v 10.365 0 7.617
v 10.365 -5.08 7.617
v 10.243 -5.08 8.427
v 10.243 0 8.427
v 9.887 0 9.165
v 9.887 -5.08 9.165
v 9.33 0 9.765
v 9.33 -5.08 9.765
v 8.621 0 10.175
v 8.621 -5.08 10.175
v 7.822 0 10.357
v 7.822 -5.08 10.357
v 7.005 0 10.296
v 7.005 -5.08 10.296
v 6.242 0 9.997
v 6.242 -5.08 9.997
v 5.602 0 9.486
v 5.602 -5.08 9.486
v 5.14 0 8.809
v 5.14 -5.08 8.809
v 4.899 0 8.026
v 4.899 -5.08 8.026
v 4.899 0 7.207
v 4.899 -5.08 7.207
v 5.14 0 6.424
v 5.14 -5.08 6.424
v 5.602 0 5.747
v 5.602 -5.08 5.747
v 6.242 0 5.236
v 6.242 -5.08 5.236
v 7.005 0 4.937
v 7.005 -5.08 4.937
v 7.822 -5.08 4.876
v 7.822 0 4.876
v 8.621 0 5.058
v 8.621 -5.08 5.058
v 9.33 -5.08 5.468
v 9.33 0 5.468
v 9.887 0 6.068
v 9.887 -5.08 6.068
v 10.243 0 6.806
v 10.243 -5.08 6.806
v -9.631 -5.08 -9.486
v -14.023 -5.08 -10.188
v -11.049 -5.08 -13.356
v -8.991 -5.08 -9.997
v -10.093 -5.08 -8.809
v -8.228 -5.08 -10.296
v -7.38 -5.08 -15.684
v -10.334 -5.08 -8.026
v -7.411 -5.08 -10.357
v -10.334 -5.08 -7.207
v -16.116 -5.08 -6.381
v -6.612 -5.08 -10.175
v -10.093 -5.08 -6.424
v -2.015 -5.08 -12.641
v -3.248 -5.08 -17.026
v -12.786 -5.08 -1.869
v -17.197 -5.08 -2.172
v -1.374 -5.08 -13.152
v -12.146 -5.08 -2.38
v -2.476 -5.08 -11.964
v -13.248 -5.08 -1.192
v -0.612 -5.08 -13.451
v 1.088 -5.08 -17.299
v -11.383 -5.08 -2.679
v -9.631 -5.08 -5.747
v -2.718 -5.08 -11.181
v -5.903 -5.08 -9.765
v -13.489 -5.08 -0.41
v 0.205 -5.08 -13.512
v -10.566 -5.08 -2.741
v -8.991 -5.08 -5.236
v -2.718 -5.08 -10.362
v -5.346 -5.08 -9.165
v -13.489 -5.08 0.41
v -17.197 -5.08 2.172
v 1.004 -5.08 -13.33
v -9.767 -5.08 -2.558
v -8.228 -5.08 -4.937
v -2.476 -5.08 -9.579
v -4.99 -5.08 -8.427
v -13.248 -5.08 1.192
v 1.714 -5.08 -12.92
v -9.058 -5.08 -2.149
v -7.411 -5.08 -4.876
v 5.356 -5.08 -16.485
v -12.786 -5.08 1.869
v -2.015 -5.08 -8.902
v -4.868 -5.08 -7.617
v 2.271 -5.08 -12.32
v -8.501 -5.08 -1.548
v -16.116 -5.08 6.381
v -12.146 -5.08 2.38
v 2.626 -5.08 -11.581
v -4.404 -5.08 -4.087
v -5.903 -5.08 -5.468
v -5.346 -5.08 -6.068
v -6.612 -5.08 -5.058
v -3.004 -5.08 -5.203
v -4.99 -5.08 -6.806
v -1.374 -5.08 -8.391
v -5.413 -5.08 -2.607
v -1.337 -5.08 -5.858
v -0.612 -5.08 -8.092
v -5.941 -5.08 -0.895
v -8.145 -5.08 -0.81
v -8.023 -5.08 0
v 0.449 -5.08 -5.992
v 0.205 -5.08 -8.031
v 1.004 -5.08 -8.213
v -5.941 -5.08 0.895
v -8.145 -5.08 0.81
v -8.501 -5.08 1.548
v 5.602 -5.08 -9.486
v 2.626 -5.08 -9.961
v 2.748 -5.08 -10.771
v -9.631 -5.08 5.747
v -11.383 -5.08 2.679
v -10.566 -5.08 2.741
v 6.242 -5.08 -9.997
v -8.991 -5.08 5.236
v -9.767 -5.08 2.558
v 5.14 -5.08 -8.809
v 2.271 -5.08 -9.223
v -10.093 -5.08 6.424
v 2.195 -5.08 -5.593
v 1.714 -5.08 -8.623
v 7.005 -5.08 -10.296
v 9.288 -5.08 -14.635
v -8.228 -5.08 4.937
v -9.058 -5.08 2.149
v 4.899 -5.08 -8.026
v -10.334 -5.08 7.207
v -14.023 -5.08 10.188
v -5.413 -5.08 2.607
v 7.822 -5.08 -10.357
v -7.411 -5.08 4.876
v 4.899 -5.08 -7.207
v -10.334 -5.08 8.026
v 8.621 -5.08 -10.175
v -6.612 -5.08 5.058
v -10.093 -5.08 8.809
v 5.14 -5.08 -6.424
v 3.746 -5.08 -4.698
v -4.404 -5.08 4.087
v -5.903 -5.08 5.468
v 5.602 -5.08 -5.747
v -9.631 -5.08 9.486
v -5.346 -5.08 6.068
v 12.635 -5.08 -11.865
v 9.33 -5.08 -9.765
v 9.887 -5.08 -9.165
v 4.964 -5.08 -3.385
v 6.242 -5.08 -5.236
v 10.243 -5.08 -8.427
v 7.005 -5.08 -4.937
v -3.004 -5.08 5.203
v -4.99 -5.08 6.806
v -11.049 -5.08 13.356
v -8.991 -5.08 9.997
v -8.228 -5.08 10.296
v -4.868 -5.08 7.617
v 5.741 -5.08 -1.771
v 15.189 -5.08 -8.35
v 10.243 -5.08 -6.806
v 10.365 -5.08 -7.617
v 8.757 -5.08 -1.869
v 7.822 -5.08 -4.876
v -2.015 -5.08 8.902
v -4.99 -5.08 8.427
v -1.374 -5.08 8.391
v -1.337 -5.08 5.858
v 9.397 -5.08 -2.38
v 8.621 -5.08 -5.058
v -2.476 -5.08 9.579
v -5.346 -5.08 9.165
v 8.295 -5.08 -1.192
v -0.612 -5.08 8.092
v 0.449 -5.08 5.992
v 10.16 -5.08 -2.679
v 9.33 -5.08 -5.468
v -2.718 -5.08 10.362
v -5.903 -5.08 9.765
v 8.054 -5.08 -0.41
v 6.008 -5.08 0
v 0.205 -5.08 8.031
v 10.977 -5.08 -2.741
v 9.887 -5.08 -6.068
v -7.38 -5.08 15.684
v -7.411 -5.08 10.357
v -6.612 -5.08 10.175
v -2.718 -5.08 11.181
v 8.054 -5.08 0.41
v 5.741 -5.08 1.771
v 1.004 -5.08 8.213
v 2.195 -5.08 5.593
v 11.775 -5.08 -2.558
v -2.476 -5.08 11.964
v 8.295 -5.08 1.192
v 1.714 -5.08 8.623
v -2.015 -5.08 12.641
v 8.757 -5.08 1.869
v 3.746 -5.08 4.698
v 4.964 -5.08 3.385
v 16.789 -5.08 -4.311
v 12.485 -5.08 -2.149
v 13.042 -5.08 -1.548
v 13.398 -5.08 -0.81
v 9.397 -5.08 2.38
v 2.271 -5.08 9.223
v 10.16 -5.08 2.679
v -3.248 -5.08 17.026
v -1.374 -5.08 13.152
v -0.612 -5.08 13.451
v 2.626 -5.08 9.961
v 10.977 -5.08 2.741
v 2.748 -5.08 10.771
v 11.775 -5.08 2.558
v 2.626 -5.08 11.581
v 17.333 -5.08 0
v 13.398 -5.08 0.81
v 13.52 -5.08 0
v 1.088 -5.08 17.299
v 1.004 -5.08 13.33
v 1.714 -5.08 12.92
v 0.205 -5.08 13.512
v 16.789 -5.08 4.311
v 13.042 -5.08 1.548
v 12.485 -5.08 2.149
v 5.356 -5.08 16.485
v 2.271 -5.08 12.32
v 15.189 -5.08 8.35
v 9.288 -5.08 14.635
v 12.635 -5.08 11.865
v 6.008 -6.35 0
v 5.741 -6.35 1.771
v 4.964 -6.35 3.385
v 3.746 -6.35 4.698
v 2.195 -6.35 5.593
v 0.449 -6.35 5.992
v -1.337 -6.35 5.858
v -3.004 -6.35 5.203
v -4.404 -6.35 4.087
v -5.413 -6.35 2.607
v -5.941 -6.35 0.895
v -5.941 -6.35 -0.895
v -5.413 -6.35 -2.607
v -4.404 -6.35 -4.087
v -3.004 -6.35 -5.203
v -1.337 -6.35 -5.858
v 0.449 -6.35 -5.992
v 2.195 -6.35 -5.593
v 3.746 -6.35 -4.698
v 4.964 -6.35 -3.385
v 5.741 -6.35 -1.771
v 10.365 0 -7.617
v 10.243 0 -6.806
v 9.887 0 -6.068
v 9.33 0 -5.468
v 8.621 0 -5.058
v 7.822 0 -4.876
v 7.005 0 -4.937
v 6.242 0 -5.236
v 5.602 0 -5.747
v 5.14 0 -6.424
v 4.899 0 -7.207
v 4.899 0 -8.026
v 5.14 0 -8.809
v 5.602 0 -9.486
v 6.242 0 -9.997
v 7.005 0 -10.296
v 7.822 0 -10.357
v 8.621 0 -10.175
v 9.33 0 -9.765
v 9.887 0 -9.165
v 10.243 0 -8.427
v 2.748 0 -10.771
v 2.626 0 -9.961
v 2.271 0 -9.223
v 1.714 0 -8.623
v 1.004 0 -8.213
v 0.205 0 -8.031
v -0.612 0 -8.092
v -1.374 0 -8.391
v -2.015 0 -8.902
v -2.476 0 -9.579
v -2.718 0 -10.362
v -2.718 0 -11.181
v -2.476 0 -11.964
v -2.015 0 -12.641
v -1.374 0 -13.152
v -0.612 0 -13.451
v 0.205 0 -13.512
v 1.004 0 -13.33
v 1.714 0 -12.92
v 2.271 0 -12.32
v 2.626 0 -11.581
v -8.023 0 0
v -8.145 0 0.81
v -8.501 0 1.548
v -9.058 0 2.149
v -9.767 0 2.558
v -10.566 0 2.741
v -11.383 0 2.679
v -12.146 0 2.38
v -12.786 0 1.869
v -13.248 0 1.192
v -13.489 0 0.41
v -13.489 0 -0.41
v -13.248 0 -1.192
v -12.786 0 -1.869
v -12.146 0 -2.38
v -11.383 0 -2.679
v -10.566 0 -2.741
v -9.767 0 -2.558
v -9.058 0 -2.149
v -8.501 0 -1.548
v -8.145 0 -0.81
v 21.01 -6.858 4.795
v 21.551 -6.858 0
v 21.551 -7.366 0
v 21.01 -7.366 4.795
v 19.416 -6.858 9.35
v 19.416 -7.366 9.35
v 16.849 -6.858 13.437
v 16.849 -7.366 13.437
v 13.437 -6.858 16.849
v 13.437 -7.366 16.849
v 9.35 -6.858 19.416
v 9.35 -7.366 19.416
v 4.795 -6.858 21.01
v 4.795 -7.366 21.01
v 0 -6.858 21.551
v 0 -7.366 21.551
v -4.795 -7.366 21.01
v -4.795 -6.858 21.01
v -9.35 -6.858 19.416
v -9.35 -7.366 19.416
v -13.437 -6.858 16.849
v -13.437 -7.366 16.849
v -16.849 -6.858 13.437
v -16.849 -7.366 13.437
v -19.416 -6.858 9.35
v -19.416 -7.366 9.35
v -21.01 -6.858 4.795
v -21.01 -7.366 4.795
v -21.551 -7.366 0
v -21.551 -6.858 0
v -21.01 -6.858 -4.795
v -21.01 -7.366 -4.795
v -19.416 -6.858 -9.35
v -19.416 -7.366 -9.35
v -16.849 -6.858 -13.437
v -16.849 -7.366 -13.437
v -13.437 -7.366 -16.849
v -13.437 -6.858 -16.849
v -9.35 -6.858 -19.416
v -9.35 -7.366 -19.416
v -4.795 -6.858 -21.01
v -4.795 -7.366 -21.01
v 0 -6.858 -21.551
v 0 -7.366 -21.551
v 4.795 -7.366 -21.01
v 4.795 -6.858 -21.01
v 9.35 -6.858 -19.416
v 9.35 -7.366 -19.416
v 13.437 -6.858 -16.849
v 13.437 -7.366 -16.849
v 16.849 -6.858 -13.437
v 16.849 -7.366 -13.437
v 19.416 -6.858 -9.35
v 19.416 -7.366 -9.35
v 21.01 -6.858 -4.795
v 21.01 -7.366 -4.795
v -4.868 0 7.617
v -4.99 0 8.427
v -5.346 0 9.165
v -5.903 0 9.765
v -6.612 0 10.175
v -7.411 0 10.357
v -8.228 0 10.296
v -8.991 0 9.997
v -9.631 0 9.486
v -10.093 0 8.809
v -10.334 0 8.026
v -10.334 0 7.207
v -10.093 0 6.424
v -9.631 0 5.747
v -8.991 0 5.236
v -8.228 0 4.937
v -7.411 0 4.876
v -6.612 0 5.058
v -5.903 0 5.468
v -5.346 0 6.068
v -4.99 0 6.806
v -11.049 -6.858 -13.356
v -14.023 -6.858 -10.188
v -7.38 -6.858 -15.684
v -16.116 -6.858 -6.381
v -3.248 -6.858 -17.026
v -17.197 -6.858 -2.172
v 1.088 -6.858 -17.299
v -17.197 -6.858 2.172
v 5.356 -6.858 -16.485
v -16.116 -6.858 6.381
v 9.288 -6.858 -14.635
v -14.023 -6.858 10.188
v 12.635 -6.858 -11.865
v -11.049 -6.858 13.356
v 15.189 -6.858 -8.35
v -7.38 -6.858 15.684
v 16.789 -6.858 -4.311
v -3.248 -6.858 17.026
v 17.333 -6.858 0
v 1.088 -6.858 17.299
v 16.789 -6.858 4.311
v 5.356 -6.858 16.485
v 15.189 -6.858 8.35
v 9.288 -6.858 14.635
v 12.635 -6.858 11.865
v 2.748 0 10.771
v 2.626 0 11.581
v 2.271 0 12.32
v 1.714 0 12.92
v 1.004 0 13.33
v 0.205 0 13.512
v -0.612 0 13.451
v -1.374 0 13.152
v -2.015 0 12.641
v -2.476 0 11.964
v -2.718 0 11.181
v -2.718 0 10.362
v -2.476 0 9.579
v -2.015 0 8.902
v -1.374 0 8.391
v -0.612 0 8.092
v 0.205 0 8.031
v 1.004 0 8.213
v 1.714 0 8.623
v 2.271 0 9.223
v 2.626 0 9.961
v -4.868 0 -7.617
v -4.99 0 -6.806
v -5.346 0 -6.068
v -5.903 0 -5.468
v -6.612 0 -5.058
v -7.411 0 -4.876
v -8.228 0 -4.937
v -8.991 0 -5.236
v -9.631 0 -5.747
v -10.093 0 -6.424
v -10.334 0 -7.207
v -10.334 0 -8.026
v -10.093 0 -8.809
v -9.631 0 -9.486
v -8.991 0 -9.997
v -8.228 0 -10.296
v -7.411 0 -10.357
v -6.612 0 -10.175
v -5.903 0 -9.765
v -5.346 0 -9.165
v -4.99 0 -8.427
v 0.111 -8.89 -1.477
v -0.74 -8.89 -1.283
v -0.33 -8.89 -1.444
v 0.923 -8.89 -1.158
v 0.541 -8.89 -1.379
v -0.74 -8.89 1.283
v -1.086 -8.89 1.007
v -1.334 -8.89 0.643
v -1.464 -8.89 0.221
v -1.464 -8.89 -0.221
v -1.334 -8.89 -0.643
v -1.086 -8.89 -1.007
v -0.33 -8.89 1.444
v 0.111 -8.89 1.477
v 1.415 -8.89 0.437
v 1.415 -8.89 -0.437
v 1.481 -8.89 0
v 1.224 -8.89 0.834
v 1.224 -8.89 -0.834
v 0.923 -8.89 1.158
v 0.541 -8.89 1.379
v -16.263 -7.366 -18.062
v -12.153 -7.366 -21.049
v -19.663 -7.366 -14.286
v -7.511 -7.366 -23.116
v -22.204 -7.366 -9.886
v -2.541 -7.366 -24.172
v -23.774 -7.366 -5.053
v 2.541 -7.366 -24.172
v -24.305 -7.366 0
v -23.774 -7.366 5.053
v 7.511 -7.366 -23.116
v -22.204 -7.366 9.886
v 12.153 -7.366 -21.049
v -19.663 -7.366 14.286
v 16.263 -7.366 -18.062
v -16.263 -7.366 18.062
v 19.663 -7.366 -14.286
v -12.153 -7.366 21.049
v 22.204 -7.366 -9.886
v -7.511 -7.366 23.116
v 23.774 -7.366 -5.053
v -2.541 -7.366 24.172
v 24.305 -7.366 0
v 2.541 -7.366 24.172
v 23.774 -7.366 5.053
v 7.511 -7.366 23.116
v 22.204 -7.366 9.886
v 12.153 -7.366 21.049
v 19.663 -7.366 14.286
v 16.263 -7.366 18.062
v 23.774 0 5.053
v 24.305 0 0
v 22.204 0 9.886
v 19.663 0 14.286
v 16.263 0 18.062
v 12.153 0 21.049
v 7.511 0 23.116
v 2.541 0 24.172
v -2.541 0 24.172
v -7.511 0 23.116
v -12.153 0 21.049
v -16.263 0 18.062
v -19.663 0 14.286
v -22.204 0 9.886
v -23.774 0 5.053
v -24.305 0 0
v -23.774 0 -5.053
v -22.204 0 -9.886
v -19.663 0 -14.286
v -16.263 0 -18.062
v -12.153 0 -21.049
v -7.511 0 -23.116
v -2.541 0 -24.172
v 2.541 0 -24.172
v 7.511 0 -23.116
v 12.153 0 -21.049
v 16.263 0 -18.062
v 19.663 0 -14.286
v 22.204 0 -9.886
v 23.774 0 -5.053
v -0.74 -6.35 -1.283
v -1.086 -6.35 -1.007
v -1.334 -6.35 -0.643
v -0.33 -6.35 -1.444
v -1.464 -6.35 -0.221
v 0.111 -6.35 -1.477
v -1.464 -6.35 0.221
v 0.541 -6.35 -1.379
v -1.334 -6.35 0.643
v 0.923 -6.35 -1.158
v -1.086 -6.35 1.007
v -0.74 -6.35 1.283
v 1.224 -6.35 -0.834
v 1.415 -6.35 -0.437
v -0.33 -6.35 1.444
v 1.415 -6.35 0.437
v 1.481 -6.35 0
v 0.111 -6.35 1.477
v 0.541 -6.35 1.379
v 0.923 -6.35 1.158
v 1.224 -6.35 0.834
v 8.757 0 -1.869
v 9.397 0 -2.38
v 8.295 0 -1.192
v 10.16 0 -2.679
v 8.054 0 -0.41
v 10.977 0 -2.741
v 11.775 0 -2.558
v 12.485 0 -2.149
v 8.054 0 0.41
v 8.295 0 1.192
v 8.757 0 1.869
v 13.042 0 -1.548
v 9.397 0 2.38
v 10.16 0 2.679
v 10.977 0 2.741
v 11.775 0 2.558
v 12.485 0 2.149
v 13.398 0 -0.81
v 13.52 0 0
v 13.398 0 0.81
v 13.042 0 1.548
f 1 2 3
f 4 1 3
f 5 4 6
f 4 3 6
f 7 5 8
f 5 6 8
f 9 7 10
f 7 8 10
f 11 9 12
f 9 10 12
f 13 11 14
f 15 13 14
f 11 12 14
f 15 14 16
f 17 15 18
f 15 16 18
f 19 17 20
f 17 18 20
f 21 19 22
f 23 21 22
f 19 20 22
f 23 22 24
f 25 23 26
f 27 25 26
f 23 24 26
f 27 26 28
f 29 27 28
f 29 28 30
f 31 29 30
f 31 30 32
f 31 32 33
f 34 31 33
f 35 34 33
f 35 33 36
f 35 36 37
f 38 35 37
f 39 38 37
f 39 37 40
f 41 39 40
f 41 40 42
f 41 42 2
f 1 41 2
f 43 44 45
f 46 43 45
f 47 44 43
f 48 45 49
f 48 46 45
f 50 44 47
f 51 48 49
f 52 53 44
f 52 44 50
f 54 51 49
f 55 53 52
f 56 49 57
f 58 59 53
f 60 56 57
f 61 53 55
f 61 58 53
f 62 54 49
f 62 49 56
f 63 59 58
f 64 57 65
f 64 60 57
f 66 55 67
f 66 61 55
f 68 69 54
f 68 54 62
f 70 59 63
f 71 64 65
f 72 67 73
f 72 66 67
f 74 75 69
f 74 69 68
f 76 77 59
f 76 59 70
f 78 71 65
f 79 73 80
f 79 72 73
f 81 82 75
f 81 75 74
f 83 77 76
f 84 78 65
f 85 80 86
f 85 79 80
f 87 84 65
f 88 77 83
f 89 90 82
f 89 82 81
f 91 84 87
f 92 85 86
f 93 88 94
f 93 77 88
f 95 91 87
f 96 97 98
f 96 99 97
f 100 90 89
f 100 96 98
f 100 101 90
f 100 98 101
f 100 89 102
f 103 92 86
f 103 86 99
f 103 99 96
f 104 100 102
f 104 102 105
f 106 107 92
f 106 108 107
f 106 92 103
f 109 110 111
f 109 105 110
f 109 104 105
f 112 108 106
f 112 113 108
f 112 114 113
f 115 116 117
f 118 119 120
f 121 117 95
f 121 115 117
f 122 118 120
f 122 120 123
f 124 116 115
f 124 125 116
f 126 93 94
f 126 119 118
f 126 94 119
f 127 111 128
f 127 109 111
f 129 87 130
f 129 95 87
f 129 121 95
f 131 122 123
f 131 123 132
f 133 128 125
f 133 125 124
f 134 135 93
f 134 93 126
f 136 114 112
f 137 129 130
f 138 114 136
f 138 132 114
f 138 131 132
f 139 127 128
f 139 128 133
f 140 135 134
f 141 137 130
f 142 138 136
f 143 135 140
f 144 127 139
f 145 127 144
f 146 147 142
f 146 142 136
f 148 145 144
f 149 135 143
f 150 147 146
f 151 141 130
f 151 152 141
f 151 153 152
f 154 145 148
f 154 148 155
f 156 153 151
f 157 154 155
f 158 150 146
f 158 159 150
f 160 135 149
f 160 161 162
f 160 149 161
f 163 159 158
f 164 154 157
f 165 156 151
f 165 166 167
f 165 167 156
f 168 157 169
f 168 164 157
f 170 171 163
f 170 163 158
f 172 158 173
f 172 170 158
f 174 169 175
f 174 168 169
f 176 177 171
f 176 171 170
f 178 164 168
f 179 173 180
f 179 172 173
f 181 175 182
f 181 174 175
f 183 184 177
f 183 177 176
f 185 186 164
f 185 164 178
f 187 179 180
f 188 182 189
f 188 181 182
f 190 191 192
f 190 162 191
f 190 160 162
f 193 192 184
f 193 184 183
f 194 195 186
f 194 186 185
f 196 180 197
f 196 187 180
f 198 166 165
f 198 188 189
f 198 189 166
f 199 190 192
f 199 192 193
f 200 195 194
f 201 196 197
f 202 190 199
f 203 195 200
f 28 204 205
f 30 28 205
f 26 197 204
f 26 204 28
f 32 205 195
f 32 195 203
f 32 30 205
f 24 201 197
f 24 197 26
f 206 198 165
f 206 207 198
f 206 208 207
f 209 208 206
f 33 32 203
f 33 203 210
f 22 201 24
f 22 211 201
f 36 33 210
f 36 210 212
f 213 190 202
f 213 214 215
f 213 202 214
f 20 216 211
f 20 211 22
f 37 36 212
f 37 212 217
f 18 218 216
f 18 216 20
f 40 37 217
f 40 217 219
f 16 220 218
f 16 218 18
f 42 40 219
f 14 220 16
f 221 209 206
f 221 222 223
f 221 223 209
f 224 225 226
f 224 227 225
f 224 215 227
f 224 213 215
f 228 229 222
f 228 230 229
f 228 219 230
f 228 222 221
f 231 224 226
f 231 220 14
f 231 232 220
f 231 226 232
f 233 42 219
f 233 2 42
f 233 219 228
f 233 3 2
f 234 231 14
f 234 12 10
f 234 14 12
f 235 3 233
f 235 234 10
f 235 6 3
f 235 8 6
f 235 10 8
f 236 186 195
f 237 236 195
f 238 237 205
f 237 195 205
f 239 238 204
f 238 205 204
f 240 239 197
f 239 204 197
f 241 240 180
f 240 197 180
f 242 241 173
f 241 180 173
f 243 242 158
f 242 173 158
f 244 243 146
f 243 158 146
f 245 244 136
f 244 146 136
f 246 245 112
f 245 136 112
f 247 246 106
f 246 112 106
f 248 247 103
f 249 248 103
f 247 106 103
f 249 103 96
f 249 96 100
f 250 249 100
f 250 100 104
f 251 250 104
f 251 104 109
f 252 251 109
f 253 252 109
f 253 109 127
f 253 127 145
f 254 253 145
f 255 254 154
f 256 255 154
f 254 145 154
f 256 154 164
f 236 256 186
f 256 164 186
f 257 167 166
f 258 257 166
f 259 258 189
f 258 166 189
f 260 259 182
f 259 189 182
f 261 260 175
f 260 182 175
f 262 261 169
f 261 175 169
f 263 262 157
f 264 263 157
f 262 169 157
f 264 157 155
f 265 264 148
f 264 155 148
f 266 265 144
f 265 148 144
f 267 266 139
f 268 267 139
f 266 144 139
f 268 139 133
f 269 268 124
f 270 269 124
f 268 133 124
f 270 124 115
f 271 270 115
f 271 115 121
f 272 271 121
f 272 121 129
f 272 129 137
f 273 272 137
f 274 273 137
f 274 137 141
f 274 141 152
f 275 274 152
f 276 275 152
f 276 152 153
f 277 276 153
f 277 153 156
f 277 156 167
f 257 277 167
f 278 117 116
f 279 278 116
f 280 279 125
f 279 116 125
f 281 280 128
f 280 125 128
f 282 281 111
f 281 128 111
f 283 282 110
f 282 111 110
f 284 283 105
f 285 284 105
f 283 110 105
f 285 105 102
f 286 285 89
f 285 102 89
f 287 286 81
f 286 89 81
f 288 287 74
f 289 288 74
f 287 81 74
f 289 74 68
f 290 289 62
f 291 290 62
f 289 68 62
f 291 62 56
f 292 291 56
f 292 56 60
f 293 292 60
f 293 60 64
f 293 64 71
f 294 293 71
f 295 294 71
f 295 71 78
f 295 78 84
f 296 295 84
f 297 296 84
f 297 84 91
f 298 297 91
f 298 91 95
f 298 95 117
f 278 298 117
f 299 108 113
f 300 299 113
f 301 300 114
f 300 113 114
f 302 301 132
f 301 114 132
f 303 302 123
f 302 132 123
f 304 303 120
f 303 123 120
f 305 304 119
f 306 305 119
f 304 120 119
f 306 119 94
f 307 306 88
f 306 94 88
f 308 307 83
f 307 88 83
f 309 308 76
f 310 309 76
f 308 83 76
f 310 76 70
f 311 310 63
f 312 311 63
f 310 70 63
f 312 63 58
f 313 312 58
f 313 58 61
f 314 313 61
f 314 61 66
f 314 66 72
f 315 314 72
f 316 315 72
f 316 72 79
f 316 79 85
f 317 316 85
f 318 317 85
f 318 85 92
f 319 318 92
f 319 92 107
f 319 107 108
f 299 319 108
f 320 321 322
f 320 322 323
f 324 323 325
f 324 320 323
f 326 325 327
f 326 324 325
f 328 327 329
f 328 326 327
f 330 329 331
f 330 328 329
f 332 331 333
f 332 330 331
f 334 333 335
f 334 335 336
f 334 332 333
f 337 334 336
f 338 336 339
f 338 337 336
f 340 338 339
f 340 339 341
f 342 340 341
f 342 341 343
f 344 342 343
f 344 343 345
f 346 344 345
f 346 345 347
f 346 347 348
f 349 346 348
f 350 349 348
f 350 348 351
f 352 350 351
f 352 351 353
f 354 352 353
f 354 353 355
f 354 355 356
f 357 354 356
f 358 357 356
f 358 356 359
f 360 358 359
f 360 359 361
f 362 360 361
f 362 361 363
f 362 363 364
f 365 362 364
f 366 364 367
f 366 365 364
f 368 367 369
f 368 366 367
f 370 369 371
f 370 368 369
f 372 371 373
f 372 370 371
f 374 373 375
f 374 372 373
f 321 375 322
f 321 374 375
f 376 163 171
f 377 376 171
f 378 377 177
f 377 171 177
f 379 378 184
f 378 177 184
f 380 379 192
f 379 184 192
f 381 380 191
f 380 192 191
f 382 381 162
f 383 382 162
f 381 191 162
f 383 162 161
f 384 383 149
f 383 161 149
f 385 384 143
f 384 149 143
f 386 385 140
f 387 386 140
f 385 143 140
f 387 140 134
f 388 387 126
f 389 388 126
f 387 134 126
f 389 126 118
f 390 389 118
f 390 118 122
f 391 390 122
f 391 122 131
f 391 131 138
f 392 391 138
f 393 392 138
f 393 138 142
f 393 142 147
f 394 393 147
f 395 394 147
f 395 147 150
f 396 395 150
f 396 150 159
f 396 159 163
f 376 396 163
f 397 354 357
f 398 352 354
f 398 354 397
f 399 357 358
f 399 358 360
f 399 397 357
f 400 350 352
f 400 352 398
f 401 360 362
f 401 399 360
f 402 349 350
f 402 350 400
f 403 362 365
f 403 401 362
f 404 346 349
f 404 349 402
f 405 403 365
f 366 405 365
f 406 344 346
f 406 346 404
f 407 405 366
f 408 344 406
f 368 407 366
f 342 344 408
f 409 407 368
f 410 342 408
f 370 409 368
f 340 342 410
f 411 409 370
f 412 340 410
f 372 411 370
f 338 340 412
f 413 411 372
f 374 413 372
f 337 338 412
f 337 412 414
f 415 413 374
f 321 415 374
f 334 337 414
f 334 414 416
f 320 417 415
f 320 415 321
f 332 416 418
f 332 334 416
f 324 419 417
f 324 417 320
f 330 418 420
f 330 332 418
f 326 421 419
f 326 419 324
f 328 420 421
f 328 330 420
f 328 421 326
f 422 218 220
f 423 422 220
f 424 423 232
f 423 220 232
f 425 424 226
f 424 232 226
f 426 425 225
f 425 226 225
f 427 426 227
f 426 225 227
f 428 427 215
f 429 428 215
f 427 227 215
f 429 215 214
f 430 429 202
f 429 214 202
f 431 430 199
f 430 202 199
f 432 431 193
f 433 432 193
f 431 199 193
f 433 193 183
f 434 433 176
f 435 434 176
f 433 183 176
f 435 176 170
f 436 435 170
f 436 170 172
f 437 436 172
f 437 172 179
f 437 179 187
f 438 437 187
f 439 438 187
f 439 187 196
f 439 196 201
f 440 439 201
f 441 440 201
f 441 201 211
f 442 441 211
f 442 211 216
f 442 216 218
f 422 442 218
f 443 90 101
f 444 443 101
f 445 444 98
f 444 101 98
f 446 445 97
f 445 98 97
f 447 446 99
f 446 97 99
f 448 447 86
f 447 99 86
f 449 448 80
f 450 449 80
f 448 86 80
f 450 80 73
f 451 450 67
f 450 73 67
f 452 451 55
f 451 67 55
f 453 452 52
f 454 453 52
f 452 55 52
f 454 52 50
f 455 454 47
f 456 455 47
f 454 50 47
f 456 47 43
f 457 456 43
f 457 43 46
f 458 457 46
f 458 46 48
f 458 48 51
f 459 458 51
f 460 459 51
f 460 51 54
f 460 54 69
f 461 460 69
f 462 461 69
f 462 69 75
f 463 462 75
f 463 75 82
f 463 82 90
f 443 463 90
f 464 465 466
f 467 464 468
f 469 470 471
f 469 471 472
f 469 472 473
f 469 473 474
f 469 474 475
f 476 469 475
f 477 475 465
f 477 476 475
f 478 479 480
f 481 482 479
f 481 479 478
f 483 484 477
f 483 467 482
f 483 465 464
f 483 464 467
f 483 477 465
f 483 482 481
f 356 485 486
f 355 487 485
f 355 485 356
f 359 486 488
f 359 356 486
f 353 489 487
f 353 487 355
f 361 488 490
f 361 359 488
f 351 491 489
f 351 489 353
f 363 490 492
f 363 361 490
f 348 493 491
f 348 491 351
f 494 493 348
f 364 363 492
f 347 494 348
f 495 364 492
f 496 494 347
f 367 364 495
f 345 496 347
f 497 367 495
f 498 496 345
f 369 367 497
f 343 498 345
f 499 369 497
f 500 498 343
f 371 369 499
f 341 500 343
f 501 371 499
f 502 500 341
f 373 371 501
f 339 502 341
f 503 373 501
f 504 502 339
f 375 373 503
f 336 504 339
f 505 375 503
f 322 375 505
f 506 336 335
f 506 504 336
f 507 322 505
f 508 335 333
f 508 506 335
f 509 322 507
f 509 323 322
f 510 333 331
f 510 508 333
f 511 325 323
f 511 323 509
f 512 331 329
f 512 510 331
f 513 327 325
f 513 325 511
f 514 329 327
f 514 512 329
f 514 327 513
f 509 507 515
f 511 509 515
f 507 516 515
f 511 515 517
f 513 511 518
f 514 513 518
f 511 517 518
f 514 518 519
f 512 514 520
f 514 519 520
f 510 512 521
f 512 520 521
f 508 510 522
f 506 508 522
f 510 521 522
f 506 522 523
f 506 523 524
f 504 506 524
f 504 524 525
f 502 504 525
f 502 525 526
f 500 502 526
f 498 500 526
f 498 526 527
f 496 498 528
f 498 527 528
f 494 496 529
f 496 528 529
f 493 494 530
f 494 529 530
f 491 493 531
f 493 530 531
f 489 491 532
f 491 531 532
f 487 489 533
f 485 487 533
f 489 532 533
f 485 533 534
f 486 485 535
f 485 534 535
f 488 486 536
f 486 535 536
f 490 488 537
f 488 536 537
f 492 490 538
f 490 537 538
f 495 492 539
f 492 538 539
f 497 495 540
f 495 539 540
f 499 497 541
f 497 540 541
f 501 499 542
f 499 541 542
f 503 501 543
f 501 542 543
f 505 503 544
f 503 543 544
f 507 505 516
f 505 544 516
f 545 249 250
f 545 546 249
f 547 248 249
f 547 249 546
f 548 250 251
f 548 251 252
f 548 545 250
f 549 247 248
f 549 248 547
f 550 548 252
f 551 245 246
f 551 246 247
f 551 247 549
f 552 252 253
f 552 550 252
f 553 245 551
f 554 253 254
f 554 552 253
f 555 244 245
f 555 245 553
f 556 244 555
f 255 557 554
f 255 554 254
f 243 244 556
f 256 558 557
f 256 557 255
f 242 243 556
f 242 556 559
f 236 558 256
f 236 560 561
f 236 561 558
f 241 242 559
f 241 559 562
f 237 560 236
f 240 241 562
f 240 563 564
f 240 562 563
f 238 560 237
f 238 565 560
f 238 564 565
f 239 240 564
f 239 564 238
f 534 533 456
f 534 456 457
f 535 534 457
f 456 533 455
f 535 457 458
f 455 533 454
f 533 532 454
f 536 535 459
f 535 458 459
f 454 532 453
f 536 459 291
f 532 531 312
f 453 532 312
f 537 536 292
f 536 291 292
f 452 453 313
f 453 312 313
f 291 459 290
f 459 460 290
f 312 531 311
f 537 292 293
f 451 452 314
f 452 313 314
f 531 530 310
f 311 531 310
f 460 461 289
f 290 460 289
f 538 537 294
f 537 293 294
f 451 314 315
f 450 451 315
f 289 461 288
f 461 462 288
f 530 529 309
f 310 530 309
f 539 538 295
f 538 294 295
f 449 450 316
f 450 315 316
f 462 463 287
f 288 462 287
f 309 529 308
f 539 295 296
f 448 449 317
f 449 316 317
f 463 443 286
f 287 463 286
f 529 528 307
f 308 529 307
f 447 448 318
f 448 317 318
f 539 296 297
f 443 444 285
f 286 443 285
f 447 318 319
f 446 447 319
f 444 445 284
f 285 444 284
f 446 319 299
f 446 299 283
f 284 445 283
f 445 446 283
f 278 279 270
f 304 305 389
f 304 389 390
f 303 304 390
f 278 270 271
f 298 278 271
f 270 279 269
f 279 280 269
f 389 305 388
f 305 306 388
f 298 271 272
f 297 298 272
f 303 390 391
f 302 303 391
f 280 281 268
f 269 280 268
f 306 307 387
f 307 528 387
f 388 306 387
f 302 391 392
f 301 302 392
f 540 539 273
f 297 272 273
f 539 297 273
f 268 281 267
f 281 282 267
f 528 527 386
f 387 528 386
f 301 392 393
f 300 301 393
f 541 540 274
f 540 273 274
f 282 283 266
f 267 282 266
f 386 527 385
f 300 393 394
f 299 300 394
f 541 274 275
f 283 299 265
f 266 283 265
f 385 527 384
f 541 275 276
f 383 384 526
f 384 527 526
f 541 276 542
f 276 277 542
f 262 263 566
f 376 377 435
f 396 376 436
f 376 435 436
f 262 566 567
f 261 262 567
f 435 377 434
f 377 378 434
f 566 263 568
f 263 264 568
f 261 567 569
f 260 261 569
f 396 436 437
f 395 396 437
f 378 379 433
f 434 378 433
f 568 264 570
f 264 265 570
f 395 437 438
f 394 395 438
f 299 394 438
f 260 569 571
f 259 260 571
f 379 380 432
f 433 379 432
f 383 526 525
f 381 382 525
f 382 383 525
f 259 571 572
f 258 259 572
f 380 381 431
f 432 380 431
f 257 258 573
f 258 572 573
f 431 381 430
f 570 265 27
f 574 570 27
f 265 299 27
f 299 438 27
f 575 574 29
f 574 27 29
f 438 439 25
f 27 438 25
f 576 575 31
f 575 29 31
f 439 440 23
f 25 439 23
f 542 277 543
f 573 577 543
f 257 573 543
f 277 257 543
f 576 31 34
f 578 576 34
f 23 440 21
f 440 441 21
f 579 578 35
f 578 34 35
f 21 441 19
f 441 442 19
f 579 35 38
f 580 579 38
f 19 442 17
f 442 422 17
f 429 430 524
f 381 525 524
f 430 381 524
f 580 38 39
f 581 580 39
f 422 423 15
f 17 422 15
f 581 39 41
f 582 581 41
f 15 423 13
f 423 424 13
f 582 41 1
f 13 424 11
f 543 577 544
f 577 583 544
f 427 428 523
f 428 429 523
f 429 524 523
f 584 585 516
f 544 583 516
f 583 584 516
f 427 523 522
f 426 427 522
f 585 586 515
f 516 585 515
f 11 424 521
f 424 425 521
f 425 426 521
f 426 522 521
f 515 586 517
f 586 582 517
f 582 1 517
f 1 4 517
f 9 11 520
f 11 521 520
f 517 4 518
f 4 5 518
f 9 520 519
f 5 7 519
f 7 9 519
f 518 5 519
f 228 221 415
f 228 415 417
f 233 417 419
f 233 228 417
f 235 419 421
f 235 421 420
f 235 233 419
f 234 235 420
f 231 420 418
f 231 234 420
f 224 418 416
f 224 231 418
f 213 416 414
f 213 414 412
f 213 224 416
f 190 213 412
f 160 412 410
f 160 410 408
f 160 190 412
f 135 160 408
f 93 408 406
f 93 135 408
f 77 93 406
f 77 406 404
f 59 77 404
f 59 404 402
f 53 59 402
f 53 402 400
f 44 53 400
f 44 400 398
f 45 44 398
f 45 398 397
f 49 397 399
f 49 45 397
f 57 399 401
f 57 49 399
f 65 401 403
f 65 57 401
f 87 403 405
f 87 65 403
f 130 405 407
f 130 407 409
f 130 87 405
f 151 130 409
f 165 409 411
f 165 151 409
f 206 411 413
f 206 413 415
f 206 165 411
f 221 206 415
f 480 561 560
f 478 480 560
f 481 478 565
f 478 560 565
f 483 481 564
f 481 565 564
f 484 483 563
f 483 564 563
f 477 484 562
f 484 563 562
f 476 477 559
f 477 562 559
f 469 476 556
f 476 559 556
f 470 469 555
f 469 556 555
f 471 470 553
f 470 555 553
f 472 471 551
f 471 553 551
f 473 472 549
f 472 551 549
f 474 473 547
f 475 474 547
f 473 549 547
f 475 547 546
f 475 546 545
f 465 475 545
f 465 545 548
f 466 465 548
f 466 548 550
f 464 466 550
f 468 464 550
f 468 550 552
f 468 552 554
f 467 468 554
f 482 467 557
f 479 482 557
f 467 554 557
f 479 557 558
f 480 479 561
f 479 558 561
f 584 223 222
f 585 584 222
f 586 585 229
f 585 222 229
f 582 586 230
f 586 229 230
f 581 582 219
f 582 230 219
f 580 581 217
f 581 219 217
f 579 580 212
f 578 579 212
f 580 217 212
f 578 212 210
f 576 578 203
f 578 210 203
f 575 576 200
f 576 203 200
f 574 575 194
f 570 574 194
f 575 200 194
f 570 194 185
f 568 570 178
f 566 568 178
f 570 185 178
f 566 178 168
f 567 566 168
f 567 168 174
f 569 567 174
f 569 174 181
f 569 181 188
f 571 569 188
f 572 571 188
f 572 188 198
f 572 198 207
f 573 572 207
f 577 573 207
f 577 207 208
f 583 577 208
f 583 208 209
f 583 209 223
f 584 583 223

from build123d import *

# Parameters (mm, degrees)
F0_R      = 24.305161
F1_DEPTH  = 5.08
F2_R      = 24.305161
F2_R_2    = 21.550516
F5_DEPTH  = 2.286
F4_R      = 21.550516
F4_R_2    = 17.333269
F6_DEPTH  = 1.778
F3_R      = 6.008361
F7_DEPTH  = 1.27
F8_R      = 1.480993
F9_DEPTH  = 2.54
F10_R     = 2.748389
F11_DEPTH = 25.4


with BuildPart() as f1:
    # F0 (on Front) → F1 (new body)
    with BuildSketch(Plane.XZ):
        Circle(F0_R)
    extrude(amount=F1_DEPTH)

    # F2 (on face) → F5 (join)
    with BuildSketch(Plane.XZ.offset(5.08)):
        Circle(F2_R)
        Circle(F2_R_2, mode=Mode.SUBTRACT)
    extrude(amount=F5_DEPTH)

    # F4 (on face) → F6 (join)
    with BuildSketch(Plane.XZ.offset(5.08)):
        Circle(F4_R)
        Circle(F4_R_2, mode=Mode.SUBTRACT)
    extrude(amount=F6_DEPTH)

    # F3 (on face) → F7 (join)
    with BuildSketch(Plane.XZ.offset(5.08)):
        Circle(F3_R)
    extrude(amount=F7_DEPTH)

    # F8 (on face) → F9 (join)
    with BuildSketch(Plane.XZ.offset(6.35)):
        Circle(F8_R)
    extrude(amount=F9_DEPTH)

    # F10 (on face) → F11 (cut)
    with BuildSketch(Plane.XZ.offset(5.08)):
        with Locations((0, 10.771388)):
            Circle(F10_R)
        with Locations((7.616522, 7.616522)):
            Circle(F10_R)
        with Locations((10.771388, 0)):
            Circle(F10_R)
        with Locations((7.616522, -7.616522)):
            Circle(F10_R)
        with Locations((0, -10.771388)):
            Circle(F10_R)
        with Locations((-7.616522, -7.616522)):
            Circle(F10_R)
        with Locations((-10.771388, 0)):
            Circle(F10_R)
        with Locations((-7.616522, 7.616522)):
            Circle(F10_R)
    extrude(amount=-F11_DEPTH, mode=Mode.SUBTRACT)


solid = f1.part
